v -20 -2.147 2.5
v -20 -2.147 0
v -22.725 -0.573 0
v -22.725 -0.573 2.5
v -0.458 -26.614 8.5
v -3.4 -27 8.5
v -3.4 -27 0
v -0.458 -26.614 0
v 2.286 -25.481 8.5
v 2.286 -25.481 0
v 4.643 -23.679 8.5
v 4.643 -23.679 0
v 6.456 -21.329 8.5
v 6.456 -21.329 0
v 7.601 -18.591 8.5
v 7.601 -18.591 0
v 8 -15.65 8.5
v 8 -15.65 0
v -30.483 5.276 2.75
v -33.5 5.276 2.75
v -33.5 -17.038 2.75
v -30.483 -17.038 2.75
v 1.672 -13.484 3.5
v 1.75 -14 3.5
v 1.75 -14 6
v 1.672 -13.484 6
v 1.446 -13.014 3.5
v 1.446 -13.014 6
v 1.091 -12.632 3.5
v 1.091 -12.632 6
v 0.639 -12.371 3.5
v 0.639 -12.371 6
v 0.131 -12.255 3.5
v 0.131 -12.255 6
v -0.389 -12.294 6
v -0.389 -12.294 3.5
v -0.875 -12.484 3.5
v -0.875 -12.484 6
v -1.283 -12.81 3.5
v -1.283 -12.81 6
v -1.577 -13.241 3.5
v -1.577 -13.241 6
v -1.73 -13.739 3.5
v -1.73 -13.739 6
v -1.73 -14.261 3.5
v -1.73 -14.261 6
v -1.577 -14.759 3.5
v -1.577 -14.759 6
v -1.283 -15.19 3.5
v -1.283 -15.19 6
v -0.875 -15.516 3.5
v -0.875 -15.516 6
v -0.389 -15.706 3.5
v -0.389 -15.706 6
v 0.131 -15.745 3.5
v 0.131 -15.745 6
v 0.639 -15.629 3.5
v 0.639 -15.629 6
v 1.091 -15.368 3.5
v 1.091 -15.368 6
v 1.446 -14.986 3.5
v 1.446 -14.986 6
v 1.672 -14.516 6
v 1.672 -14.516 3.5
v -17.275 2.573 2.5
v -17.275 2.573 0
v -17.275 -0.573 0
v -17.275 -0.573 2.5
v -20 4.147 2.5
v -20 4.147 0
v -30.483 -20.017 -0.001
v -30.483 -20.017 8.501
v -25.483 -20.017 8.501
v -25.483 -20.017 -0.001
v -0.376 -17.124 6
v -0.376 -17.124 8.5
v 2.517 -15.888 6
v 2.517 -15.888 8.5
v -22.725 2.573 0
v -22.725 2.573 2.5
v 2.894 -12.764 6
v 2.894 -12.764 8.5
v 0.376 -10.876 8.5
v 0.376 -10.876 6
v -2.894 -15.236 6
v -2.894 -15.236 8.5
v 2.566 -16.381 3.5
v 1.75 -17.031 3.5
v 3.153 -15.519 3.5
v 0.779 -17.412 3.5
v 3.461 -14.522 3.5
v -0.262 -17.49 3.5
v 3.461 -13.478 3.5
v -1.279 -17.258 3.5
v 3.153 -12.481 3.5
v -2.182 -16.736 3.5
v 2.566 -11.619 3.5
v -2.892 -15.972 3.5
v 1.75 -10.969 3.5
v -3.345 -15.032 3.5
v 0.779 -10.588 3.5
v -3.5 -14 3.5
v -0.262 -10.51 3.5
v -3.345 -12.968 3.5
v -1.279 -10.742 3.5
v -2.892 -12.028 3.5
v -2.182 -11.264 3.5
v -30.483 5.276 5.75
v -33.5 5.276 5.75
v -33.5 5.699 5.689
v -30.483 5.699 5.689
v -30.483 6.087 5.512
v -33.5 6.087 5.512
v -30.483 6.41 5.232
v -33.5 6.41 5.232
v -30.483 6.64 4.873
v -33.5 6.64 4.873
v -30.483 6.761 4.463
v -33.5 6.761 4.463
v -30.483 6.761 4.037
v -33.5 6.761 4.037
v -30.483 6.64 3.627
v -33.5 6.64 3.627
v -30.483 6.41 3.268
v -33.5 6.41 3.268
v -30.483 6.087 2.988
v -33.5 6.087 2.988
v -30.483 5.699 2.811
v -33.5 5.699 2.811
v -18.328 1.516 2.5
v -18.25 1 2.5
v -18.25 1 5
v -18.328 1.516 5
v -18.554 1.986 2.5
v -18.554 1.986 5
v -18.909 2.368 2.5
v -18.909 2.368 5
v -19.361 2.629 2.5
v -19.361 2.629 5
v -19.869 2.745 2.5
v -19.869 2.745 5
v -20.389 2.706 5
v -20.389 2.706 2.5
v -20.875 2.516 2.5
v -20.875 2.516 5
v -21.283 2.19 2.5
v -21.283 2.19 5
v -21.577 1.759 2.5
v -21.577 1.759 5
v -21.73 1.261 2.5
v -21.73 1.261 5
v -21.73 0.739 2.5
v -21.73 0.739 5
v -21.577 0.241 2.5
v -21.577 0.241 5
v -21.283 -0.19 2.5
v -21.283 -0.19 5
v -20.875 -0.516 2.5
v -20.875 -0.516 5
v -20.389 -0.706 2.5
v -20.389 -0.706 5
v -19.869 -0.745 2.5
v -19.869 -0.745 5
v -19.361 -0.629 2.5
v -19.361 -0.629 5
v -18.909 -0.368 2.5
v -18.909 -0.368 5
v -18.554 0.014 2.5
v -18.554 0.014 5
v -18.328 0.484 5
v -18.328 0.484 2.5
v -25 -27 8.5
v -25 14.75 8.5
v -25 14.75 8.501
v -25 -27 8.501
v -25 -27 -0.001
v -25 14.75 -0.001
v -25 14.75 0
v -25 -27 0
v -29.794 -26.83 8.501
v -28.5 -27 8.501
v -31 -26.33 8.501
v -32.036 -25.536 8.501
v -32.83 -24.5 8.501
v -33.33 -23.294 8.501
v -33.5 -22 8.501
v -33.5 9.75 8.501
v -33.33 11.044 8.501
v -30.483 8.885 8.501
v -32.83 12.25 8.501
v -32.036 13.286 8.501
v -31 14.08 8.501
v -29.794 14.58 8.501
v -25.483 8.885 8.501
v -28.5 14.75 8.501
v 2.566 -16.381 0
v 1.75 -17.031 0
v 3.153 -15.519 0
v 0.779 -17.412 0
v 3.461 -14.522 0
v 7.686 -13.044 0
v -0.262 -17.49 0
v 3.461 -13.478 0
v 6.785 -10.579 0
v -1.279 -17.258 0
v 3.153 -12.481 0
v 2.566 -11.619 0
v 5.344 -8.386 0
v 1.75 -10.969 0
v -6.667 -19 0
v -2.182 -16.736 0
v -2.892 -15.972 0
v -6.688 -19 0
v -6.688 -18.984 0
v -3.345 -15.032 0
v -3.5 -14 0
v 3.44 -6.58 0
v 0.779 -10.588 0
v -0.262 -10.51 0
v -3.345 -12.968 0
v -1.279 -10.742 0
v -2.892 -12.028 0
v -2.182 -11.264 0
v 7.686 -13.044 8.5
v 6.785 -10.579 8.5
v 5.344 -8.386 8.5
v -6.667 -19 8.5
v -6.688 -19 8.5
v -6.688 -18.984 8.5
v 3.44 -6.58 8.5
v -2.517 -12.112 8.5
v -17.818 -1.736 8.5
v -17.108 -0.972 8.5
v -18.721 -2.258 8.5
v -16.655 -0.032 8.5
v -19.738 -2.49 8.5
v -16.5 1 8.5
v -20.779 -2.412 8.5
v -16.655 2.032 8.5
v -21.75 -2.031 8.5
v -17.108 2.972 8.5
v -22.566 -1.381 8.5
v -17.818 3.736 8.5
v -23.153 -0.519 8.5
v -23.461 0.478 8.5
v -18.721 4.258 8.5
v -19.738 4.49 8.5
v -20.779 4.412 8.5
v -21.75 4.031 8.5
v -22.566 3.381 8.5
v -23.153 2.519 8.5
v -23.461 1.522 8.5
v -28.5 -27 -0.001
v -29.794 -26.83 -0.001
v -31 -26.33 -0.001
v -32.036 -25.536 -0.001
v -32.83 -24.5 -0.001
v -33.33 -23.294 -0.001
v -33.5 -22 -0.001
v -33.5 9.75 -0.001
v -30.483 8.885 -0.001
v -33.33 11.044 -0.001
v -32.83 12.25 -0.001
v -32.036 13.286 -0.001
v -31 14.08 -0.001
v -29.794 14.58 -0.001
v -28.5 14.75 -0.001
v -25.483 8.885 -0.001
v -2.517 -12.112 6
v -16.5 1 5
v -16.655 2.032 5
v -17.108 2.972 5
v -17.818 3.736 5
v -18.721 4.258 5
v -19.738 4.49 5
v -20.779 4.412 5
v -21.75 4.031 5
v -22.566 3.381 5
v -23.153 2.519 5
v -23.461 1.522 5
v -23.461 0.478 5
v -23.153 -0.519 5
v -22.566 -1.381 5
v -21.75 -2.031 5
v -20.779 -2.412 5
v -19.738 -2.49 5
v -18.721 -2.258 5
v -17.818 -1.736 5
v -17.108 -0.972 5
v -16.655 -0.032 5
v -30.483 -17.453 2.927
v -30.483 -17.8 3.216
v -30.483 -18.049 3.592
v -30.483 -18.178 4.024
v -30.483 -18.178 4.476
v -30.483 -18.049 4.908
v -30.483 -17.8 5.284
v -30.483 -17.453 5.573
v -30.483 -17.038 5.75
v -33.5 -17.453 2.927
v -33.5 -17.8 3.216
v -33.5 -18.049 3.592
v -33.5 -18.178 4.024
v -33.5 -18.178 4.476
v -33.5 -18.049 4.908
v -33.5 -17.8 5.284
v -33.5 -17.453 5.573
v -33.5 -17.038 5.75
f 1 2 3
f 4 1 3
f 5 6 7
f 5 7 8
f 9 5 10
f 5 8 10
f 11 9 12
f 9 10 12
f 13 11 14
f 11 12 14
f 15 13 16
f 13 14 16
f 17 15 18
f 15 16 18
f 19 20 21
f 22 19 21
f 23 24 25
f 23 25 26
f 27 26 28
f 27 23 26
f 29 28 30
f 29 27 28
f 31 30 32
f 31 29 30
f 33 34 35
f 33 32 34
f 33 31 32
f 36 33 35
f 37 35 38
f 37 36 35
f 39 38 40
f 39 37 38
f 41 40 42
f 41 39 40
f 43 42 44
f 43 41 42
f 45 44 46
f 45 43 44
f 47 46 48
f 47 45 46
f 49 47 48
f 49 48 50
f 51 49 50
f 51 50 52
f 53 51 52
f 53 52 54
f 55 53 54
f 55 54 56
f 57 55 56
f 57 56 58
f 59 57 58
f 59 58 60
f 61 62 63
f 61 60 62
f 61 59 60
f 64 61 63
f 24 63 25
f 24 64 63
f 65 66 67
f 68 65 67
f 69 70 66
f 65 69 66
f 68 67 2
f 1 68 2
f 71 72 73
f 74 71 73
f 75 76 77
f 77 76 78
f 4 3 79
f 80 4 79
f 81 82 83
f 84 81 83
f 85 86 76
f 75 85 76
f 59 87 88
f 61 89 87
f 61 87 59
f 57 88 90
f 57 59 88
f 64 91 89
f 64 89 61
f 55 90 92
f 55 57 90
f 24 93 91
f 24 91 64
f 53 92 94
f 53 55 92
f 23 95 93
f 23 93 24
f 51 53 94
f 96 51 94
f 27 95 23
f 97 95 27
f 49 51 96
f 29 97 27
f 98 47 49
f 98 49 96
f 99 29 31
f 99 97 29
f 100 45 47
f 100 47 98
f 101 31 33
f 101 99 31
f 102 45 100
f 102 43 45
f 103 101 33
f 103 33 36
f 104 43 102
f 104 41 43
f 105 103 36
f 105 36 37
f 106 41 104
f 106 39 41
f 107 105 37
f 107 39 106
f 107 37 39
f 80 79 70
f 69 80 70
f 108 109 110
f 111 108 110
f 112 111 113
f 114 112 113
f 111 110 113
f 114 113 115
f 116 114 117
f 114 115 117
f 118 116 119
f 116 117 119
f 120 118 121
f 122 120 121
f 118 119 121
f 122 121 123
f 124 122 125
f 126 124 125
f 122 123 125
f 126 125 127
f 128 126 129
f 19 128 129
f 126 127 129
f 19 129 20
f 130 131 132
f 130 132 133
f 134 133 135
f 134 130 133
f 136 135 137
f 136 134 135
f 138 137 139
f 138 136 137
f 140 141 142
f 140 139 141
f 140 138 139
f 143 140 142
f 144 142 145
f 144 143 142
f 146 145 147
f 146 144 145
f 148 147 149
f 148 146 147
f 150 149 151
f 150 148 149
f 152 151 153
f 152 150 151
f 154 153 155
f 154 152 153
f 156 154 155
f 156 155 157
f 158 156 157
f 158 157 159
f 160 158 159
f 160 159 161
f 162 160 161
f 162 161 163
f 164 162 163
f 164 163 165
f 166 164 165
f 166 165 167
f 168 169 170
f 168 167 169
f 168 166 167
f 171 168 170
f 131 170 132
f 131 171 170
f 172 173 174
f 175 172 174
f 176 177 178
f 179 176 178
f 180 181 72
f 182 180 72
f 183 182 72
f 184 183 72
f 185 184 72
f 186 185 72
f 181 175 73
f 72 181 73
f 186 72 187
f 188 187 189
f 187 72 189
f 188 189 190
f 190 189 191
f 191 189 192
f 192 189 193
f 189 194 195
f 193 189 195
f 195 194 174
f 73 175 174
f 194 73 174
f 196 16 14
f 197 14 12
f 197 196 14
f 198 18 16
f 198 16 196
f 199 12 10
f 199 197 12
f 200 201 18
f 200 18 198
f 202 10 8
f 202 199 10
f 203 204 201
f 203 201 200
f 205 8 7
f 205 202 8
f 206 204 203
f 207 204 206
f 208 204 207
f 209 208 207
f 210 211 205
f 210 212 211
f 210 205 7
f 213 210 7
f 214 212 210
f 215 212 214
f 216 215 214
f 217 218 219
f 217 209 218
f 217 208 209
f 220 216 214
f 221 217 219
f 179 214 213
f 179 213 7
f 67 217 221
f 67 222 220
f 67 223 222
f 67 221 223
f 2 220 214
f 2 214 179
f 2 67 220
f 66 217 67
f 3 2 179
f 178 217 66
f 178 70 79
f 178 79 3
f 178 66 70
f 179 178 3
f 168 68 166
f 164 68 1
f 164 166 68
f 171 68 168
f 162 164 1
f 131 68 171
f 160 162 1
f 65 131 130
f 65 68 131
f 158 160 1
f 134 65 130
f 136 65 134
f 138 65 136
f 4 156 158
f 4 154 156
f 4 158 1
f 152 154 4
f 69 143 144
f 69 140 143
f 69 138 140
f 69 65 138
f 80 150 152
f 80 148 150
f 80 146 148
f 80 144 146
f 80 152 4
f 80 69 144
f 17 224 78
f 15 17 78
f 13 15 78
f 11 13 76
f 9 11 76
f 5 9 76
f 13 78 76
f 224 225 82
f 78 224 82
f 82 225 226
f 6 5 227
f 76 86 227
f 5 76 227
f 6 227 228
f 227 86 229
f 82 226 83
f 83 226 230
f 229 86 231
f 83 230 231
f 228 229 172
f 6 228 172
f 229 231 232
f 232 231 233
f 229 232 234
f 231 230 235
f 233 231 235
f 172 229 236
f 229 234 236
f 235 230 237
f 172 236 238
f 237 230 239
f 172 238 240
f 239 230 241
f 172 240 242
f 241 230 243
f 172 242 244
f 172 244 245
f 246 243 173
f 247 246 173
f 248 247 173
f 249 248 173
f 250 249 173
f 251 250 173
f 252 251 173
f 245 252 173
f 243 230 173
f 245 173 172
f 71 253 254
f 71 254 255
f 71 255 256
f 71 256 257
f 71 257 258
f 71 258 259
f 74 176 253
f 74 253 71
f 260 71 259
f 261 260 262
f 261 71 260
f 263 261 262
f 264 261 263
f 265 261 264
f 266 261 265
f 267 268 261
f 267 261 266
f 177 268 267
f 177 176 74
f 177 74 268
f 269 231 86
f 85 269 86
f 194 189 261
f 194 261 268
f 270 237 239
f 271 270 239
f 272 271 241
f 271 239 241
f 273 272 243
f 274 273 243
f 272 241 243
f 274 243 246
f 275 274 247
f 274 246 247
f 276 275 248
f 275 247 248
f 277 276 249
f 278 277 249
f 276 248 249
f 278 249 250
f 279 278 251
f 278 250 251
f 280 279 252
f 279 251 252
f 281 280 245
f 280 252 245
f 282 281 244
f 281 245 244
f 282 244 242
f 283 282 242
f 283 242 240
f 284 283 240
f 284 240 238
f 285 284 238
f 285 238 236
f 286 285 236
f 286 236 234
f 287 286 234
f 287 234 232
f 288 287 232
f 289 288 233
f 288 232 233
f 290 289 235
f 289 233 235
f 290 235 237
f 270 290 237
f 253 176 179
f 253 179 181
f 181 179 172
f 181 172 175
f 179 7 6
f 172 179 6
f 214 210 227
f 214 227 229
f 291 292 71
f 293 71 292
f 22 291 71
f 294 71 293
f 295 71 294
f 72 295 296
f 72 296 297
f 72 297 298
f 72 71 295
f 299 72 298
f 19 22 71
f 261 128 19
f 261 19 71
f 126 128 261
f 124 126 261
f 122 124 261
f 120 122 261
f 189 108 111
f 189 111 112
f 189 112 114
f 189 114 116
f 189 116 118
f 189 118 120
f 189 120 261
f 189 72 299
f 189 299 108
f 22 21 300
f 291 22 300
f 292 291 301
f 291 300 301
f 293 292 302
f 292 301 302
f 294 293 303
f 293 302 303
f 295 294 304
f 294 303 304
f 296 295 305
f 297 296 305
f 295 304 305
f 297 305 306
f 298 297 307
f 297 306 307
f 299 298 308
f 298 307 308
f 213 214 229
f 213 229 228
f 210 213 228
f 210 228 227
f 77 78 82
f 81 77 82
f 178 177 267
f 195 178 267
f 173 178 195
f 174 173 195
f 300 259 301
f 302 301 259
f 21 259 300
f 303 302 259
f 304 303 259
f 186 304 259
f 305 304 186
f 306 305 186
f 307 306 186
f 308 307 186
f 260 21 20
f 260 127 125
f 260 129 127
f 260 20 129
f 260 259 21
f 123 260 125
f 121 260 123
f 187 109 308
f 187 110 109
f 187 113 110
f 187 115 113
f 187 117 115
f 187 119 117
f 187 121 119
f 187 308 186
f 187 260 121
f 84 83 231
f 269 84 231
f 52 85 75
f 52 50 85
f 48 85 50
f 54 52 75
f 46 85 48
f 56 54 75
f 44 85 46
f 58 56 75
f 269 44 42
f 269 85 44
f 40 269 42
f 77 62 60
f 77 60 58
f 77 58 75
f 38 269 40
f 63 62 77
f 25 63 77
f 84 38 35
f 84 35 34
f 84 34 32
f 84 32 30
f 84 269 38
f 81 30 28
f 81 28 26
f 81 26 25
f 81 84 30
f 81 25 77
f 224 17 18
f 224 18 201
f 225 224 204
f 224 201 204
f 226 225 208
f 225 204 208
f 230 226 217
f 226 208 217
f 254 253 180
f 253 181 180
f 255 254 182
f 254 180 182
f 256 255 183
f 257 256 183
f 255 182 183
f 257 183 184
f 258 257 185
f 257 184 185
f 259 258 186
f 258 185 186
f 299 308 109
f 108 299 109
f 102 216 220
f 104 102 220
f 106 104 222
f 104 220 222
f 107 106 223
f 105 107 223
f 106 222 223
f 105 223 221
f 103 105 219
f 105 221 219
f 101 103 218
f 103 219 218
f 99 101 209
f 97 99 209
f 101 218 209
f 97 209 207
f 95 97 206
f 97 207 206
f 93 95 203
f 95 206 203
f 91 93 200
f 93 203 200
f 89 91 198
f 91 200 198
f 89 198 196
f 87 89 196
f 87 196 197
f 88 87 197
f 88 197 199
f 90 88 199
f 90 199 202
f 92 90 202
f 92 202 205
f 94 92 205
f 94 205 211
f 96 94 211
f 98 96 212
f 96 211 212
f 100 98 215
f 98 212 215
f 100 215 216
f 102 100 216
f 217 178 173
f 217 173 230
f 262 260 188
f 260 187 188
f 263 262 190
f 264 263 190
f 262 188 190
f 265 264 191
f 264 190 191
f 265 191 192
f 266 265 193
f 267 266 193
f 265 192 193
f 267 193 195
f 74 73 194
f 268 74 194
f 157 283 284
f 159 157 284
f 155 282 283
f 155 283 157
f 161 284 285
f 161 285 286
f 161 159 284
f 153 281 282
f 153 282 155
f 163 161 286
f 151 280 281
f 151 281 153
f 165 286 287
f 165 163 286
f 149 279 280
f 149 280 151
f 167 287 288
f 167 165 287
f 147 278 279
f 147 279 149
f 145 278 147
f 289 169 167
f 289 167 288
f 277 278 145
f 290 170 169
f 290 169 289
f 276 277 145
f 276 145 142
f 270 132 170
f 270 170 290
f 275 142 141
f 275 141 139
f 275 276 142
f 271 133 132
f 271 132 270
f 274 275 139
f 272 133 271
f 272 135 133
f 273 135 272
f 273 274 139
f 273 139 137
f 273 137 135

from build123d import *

# Parameters (mm, degrees)
SKETCH1_R           = 1.75
BOSS_EXTRUDE1_DEPTH = 8.5
CUT_EXTRUDE2_DEPTH  = 2.5
CUT_EXTRUDE3_DEPTH  = 2.5
SKETCH5_R           = 3.5
CUT_EXTRUDE4_DEPTH  = 3.5
SKETCH6_R           = 3.5
CUT_EXTRUDE5_DEPTH  = 3.5
FILLET1_R           = 11.4
SKETCH7_W           = 8.501662988
SKETCH7_H           = 41.75
BOSS_EXTRUDE3_DEPTH = 8.5
SKETCH8_W           = 5
SKETCH8_H           = 28.902484154
CUT_EXTRUDE6_DEPTH  = 44.858046851
CUT_EXTRUDE7_REACH  = 52.235
FILLET2_R           = 5
FILLET3_R           = 5


with BuildPart() as part:
    # Sketch1 → Boss-Extrude1 (new body)
    with BuildSketch(Plane.XY):
        Polygon((8, -10), (8, -27), (-25, -27), (-25, 14.75), align=None)
        with Locations((-20, 1)):
            Circle(SKETCH1_R, mode=Mode.SUBTRACT)
        with Locations((0, -14)):
            Circle(SKETCH1_R, mode=Mode.SUBTRACT)
        Polygon((-6.687894354, -19), (-6.666666667, -19), (-6.687894354, -18.984079234), align=None, mode=Mode.SUBTRACT)
    extrude(amount=BOSS_EXTRUDE1_DEPTH)

    # Sketch3 → Cut-Extrude2 (cut)
    with BuildSketch(Plane(origin=(0, 0, 0), x_dir=(-1, 0, 0), z_dir=(0, 0, -1))):
        Polygon((22.725, 2.573279484), (20, 4.146558967), (17.275, 2.573279484), (17.275, -0.573279484), (20, -2.146558967), (22.725, -0.573279484), align=None)
    extrude(amount=-CUT_EXTRUDE2_DEPTH, mode=Mode.SUBTRACT)

    # Sketch4 → Cut-Extrude3 (cut)
    with BuildSketch(Plane.XY.offset(8.5)):
        Polygon((-2.517247174, -12.11206462), (-2.893623587, -15.23603231), (-0.376376413, -17.12396769), (2.517247174, -15.88793538), (2.893623587, -12.76396769), (0.376376413, -10.87603231), align=None)
    extrude(amount=-CUT_EXTRUDE3_DEPTH, mode=Mode.SUBTRACT)

    # Sketch5 → Cut-Extrude4 (cut)
    with BuildSketch(Plane.XY.offset(8.5)):
        with Locations((-20, 1)):
            Circle(SKETCH5_R)
    extrude(amount=-CUT_EXTRUDE4_DEPTH, mode=Mode.SUBTRACT)

    # Sketch6 → Cut-Extrude5 (cut)
    with BuildSketch(Plane(origin=(0, 0, 0), x_dir=(-1, 0, 0), z_dir=(0, 0, -1))):
        with Locations((0, -14)):
            Circle(SKETCH6_R)
    extrude(amount=-CUT_EXTRUDE5_DEPTH, mode=Mode.SUBTRACT)

    # Fillet1
    # the kernel refuses this fillet: 11.4 mm, written as the material it takes off along each edge
    with BuildSketch(Plane(origin=(8, -10, -14.25), x_dir=(0, -1, 0), z_dir=(0, 0, 1))) as fillet1_piece_1:
        with BuildLine():
            CenterArc((FILLET1_R * 0.5, -FILLET1_R), FILLET1_R, 90, 53.130102354)
            Line((-FILLET1_R * 0.3, -FILLET1_R * 0.4), (0, 0))
            Line((0, 0), (FILLET1_R * 0.5, 0))
        make_face()
    extrude(amount=37, mode=Mode.SUBTRACT)
    with BuildSketch(Plane(origin=(8, -27, -28.5), x_dir=(0, 1, 0), z_dir=(0, 0, 1))) as fillet1_piece_2:
        with BuildLine():
            CenterArc((FILLET1_R, FILLET1_R), FILLET1_R, 180, 90)
            Line((0, FILLET1_R), (0, 0))
            Line((0, 0), (FILLET1_R, 0))
        make_face()
    extrude(amount=65.5, mode=Mode.SUBTRACT)

    # Sketch7 → Boss-Extrude3 (add)
    with BuildSketch(Plane.ZY.offset(25)):
        with Locations((4.25, -6.125)):
            Rectangle(SKETCH7_W, SKETCH7_H)
    extrude(amount=BOSS_EXTRUDE3_DEPTH)

    # Sketch8 → Cut-Extrude6 (cut, through all)
    with BuildSketch(Plane.XY.offset(8.500831494)):
        with Locations((-27.983222081, -5.565864812)):
            Rectangle(SKETCH8_W, SKETCH8_H)
    extrude(amount=-CUT_EXTRUDE6_DEPTH, mode=Mode.SUBTRACT)

    # Sketch9 → Cut-Extrude7 (cut, up to next)
    with BuildSketch(Plane.ZY.offset(33.5), mode=Mode.PRIVATE) as cut_extrude7_sk1:
        with BuildLine():
            Line((5.75, -17.038286927), (5.75, 5.275984322))
            ThreePointArc((5.75, 5.275984322), (4.25, 6.775984322), (2.75, 5.275984322))
            Line((2.75, 5.275984322), (2.75, -17.038286927))
            ThreePointArc((2.75, -17.038286927), (4.25, -18.194874392), (5.75, -17.038286927))
        make_face()
    cut_extrude7_tool1 = extrude(cut_extrude7_sk1.sketch, amount=-CUT_EXTRUDE7_REACH, mode=Mode.PRIVATE) & part.part
    add(cut_extrude7_tool1.solids().sort_by_distance((-33.5, -5.719772, 4.25))[0], mode=Mode.SUBTRACT)

    # Fillet2
    fillet2_edges = [part.edges().sort_by_distance(p)[0] for p in [
        (-33.5, -27, 4.25),
    ]]
    fillet(fillet2_edges, radius=FILLET2_R)

    # Fillet3
    fillet3_edges = [part.edges().sort_by_distance(p)[0] for p in [
        (-33.5, 14.75, 4.25),
    ]]
    fillet(fillet3_edges, radius=FILLET3_R)


solid = part.part
